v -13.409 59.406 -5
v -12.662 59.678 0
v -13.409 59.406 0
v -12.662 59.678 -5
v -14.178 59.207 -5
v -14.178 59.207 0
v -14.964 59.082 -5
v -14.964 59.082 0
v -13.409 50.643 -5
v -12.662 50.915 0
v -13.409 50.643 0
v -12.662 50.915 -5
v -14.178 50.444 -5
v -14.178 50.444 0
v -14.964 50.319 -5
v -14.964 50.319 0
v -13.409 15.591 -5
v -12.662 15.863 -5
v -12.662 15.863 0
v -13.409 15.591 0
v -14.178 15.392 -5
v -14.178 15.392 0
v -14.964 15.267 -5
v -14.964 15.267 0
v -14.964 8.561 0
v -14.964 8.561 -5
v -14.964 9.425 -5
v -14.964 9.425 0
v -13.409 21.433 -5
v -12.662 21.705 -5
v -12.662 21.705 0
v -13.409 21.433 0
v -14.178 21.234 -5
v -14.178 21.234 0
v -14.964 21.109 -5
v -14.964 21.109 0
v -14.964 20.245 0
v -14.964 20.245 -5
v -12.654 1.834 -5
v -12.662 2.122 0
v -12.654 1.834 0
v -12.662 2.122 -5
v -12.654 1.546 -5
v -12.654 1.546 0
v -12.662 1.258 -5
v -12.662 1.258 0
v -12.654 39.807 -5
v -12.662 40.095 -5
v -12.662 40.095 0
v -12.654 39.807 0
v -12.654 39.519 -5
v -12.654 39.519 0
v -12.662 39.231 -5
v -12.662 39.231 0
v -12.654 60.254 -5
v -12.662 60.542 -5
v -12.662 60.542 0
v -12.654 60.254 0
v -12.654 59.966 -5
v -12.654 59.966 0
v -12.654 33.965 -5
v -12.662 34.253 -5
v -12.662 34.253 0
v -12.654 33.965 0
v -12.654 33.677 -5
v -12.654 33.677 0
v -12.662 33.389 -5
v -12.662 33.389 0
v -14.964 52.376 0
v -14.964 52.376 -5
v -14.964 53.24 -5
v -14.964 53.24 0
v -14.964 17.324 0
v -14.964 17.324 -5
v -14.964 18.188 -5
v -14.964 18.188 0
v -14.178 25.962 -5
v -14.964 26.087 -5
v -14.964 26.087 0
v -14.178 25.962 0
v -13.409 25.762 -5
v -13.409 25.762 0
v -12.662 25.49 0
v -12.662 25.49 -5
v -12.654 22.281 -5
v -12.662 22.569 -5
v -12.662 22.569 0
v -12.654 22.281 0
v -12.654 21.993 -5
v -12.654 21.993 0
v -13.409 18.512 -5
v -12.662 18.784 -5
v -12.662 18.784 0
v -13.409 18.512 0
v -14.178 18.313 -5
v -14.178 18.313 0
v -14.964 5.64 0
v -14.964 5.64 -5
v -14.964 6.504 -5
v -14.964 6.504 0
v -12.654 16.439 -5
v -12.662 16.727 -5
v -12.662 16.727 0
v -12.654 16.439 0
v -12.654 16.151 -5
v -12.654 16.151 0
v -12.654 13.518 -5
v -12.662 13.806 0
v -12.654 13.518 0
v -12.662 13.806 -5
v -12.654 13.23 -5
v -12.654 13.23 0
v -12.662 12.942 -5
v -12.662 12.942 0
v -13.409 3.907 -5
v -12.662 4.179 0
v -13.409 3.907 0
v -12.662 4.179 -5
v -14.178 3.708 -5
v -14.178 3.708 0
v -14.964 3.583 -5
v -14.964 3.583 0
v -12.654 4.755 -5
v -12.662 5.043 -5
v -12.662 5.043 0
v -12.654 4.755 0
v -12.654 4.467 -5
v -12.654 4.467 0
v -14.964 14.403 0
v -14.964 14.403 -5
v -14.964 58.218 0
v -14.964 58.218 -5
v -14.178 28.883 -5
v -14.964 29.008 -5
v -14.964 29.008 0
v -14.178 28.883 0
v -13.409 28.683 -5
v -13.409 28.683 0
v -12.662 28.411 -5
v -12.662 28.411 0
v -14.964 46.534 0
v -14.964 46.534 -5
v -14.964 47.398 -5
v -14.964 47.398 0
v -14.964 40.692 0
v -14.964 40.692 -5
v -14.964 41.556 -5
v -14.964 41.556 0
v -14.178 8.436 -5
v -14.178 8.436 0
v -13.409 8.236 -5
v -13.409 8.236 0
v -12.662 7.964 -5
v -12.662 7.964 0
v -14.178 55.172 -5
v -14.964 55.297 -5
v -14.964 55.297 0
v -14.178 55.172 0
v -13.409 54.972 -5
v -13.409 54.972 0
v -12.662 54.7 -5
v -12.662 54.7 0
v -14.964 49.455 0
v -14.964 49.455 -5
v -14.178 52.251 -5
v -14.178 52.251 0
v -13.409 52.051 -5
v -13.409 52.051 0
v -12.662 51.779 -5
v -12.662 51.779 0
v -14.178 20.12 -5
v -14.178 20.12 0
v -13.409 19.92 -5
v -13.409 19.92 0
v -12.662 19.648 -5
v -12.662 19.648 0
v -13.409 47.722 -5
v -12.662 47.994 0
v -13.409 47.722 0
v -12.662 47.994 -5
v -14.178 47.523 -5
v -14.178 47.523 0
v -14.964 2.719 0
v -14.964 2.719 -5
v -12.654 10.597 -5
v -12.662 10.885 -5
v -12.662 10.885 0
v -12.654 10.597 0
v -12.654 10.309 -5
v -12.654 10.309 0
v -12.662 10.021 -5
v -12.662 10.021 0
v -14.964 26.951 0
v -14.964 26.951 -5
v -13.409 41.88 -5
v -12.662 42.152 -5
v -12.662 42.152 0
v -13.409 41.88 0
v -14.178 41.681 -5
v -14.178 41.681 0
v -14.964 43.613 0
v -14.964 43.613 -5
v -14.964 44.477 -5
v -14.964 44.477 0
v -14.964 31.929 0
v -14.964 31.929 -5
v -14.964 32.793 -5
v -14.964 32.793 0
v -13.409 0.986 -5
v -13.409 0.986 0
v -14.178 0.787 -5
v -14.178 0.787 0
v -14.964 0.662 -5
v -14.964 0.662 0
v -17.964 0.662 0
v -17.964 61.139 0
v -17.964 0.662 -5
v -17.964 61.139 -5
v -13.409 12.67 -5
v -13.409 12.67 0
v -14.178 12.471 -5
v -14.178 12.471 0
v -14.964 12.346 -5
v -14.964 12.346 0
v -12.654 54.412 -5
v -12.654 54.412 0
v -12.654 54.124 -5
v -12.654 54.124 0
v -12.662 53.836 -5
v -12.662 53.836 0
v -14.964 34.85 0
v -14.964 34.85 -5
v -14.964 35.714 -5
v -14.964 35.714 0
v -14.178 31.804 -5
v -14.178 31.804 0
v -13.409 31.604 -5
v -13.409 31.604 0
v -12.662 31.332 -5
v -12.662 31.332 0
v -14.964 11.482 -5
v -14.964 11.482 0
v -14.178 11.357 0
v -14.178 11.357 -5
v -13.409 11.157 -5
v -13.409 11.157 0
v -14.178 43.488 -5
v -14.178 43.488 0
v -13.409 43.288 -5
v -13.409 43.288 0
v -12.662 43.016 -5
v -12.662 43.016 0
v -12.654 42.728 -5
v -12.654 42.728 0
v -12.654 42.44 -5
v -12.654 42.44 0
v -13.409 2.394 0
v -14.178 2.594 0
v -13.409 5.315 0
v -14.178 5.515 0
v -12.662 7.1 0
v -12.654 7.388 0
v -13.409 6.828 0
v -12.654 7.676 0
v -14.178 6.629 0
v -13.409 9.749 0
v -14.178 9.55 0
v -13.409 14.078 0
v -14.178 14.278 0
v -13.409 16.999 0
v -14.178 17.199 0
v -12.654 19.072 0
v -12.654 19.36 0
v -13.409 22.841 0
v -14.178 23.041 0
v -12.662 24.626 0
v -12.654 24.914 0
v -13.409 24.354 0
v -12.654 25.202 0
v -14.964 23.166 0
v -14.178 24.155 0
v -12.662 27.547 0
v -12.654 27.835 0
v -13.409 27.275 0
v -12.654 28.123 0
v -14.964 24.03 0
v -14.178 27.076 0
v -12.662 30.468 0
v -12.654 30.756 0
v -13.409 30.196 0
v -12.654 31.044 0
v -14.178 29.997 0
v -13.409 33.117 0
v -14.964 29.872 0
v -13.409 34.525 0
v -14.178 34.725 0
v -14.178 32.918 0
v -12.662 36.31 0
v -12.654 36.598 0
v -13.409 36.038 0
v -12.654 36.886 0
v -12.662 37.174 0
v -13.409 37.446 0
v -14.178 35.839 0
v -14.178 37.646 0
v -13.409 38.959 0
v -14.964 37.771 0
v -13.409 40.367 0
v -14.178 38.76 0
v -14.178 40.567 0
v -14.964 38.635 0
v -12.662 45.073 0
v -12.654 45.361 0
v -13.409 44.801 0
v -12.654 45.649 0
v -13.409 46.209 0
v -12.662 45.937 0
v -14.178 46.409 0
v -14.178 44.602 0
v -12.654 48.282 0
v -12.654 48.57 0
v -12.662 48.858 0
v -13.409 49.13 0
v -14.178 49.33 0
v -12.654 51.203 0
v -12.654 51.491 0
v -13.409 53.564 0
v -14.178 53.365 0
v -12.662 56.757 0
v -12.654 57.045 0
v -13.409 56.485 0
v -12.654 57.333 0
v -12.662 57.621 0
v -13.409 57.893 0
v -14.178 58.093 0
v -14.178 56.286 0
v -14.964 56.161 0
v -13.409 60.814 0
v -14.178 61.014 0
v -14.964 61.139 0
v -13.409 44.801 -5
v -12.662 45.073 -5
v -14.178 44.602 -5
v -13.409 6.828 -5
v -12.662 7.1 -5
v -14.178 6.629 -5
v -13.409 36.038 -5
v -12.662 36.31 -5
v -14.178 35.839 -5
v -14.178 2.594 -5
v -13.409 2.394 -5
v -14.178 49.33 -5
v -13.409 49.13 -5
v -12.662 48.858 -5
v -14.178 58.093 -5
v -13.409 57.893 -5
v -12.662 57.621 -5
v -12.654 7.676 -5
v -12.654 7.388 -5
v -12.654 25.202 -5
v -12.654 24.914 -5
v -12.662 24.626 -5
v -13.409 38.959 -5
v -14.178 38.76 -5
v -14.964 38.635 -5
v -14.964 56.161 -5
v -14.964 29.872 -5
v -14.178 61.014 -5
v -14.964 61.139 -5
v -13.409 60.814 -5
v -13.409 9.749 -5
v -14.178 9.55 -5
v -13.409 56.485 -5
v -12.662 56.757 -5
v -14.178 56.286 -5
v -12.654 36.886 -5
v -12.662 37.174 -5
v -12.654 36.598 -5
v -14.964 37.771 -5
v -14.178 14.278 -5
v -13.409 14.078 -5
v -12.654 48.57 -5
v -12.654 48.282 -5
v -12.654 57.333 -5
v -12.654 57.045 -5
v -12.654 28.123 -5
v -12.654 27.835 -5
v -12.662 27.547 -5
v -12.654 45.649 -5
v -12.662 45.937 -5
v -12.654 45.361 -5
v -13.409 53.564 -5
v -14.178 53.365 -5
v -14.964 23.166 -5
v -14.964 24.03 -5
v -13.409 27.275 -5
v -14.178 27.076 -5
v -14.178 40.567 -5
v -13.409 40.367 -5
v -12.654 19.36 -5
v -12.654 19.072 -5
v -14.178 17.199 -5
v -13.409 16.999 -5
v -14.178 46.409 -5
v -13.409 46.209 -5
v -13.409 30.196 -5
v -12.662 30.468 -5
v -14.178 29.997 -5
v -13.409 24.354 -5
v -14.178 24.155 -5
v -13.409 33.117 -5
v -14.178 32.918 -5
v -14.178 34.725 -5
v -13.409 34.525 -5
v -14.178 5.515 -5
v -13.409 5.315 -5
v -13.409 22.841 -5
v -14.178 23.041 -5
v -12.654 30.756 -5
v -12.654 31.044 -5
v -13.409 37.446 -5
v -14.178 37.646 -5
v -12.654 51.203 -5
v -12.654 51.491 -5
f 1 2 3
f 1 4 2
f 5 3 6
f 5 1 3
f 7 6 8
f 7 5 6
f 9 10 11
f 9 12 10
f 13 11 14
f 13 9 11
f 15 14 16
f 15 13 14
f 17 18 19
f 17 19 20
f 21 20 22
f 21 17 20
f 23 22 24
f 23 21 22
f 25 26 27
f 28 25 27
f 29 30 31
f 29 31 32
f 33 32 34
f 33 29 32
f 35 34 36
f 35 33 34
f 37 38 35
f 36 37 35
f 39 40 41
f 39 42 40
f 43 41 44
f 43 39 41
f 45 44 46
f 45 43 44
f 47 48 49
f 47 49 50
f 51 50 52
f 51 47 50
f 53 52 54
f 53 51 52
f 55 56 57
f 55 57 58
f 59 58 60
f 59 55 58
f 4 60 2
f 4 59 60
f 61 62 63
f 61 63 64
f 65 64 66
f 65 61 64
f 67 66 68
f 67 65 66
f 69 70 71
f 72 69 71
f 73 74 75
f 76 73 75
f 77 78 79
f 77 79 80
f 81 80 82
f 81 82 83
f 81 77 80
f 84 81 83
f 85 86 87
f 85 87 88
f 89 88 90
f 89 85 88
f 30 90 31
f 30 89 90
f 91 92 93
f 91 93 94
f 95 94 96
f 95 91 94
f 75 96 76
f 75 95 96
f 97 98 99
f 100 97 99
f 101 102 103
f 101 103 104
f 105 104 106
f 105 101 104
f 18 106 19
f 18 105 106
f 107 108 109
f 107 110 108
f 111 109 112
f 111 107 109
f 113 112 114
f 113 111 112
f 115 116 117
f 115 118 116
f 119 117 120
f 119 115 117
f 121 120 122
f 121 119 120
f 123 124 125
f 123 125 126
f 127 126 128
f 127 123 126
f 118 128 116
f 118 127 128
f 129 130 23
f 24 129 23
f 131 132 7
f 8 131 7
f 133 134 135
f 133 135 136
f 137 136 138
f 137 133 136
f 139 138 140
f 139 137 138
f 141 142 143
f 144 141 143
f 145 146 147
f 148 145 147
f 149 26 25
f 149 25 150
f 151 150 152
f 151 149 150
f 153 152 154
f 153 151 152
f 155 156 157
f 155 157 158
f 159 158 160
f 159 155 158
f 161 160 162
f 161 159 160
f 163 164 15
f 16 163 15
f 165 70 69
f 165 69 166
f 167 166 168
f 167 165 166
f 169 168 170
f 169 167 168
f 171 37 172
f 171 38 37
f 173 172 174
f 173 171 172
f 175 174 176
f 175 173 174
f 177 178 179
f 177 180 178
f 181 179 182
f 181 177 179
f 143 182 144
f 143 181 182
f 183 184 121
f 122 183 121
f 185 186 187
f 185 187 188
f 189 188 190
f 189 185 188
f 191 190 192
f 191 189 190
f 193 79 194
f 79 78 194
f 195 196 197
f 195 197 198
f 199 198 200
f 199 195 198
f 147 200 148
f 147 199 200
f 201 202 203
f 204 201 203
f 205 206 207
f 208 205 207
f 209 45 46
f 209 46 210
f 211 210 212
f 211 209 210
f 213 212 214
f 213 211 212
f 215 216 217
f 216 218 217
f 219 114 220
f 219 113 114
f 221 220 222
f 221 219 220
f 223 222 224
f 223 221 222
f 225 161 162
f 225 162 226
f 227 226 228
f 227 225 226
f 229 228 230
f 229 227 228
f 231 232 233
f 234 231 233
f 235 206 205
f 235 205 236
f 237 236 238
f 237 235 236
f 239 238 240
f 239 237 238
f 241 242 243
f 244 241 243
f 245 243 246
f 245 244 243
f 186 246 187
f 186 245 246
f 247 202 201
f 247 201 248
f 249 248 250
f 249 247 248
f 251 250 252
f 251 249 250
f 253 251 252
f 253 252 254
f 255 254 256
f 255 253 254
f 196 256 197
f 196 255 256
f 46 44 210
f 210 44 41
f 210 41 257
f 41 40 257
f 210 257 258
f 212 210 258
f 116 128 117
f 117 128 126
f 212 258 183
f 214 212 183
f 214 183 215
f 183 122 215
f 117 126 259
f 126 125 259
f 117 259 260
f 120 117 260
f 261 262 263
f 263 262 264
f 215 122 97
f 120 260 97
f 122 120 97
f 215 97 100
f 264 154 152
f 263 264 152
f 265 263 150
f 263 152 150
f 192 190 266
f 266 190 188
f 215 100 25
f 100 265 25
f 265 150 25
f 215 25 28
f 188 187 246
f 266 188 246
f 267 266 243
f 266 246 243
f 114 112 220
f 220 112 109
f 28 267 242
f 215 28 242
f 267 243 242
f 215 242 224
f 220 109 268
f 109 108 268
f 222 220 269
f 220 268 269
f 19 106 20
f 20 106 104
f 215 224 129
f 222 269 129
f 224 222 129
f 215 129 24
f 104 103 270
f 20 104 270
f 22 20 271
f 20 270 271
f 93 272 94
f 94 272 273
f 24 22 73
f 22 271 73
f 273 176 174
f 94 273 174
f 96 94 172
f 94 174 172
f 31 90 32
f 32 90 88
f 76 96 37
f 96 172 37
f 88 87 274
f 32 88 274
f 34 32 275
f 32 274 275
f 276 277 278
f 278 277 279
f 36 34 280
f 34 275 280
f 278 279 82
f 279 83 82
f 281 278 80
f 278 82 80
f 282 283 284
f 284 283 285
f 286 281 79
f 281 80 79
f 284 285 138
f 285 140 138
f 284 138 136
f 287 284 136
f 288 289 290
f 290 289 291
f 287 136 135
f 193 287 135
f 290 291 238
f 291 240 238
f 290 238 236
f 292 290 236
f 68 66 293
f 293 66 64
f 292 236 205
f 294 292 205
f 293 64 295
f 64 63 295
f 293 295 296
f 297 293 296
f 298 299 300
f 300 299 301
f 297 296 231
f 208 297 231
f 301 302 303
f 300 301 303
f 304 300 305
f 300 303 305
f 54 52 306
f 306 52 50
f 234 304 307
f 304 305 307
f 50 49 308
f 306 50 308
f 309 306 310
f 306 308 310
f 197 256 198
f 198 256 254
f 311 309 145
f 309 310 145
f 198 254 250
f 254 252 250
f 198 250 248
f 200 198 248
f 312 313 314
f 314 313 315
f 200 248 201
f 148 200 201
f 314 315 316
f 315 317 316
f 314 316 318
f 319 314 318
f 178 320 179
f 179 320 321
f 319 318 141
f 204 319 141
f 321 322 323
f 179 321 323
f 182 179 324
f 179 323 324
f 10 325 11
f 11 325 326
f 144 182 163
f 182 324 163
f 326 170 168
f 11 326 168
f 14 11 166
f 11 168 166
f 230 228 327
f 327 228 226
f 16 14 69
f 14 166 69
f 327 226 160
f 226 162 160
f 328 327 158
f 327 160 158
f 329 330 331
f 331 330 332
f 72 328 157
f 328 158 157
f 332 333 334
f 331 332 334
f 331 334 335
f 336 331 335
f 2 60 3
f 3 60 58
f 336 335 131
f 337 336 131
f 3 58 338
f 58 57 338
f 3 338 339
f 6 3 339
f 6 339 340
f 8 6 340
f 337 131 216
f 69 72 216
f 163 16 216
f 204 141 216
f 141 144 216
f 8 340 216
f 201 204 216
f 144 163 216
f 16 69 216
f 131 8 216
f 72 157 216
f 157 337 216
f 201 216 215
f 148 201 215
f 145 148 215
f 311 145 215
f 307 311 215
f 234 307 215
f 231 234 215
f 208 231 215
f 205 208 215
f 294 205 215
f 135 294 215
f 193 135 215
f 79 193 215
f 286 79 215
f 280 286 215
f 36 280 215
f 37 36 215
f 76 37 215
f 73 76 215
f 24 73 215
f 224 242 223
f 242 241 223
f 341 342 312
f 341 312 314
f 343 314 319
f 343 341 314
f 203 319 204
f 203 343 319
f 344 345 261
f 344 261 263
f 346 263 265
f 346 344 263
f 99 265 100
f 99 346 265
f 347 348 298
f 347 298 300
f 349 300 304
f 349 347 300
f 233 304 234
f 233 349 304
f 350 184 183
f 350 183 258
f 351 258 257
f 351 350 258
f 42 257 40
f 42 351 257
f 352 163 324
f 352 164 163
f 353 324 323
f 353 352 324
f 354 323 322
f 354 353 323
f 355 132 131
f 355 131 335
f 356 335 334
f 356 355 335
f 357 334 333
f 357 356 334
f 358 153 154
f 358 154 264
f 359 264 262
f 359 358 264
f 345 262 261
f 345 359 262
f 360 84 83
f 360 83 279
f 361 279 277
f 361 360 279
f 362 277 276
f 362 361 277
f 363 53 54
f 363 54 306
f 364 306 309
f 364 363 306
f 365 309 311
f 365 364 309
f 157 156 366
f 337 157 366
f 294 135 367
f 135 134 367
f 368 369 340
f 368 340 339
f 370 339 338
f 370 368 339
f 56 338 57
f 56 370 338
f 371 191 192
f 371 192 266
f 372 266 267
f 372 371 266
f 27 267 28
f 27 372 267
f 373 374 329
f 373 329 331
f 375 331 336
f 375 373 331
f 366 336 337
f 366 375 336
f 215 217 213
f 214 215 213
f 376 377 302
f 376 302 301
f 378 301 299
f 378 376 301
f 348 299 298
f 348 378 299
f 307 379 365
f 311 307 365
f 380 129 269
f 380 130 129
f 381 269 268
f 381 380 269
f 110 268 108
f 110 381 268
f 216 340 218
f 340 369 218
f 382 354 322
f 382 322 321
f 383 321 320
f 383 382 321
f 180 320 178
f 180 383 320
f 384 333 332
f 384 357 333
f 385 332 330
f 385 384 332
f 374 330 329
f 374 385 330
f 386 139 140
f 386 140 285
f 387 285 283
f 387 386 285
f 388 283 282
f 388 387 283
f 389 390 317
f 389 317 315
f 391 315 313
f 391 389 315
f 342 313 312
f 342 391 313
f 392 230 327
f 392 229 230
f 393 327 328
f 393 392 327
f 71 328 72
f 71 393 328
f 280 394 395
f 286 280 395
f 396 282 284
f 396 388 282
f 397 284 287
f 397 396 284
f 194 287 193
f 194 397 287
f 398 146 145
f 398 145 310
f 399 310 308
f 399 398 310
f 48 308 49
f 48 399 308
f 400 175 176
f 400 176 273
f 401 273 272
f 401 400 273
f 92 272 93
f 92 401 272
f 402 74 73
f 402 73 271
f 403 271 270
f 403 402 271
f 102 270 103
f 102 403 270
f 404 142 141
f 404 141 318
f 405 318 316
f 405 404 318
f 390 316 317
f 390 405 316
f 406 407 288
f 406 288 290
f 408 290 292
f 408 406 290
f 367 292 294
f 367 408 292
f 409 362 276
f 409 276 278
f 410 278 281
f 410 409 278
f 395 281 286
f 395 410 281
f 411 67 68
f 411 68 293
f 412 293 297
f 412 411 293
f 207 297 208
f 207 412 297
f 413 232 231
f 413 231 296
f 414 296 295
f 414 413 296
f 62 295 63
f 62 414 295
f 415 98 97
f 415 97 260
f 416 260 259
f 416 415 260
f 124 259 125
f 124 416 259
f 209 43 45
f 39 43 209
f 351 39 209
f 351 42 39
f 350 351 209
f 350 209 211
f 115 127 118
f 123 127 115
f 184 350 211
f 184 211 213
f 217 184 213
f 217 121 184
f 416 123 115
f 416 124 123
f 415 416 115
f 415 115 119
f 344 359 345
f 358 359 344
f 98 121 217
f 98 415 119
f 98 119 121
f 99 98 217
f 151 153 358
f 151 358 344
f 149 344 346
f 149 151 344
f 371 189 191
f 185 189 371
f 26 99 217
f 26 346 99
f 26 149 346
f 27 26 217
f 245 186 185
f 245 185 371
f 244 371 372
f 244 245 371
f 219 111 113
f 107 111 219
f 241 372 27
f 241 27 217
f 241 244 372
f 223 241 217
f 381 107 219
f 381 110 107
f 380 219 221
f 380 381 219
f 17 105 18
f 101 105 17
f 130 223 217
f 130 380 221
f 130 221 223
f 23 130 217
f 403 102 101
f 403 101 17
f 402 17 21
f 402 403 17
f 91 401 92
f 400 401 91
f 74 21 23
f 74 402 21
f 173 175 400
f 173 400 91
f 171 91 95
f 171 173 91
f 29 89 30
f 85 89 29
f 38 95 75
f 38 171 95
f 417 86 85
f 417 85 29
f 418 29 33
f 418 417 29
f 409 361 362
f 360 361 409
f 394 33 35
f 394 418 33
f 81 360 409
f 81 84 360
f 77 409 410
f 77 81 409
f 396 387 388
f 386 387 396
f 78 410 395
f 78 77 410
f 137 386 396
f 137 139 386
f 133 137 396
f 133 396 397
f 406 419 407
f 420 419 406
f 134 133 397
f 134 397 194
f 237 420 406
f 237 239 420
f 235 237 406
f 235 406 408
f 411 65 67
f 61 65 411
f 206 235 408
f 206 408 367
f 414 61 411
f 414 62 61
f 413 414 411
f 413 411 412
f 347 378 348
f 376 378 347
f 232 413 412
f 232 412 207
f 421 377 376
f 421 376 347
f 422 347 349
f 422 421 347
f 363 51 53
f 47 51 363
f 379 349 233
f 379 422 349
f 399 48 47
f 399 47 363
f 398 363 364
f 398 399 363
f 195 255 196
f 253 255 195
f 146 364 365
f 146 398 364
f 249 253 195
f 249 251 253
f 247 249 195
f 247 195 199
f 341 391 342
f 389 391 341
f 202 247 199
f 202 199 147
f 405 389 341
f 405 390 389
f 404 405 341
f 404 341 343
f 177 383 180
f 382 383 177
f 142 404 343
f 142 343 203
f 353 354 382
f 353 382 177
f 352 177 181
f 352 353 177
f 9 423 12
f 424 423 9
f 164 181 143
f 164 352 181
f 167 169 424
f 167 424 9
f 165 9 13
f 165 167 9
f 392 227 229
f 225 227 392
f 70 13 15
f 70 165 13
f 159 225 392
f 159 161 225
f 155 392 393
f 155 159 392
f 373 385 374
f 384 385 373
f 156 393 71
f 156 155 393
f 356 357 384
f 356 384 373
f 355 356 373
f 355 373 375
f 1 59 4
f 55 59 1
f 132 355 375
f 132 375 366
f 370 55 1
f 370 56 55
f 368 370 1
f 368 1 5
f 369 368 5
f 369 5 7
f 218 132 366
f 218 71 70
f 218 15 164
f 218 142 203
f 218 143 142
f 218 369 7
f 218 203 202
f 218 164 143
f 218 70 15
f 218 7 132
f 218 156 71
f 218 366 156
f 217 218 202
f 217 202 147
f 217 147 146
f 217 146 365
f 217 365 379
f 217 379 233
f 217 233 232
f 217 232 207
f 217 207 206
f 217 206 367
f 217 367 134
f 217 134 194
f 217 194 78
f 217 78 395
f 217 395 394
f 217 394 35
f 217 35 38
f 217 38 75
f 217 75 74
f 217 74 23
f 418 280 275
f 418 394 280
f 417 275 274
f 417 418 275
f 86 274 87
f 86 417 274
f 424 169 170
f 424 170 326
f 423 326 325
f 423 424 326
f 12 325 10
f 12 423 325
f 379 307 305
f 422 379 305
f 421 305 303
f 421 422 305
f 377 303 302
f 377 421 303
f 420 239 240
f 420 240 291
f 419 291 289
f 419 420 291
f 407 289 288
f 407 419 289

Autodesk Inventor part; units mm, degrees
ref_plane "YZ Plane" through (0, 0, 0) normal (1, 0, 0) x (0, 1, 0)
ref_plane "XZ Plane" through (0, 0, 0) normal (0, 1, 0) x (-1, 0, 0)
ref_plane "XY Plane" through (0, 0, 0) normal (0, 0, 1) x (1, 0, 0)
ref_plane "Arbeitsebene1" through (0, 0, -5) normal (0, 0, -1) x (-1, 0, 0)
sketch "Skizze1" plane through (0, 0, -5) normal (0, 0, -1) x (-1, 0, 0)
  arc A0 (8.6893, -1.0285) -> (10.9915, -0.4319) centre (7.7825, 7.211) ccw
  arc A1 (10.9915, -0.4319) -> (10.9915, 0.4319) centre (0, 0) ccw
  arc A2 (10.9915, 0.4319) -> (8.6893, 1.0285) centre (7.7825, -7.211) ccw
  line L0 (8.6893, -1.0285) -> (8.6893, 1.0285) construction
  arc A3 (12.6615, 1.2584) -> (14.9637, 0.6618) centre (15.8705, 8.9013) ccw
  arc A4 (12.6615, 2.1221) -> (12.6615, 1.2584) centre (23.6531, 1.6903) ccw
  arc A5 (14.9637, 2.7187) -> (12.6615, 2.1221) centre (15.8705, -5.5208) ccw
  arc A6 (8.6893, 1.0285) -> (8.5819, 1.707) centre (0, 0) ccw construction
  arc A7 (8.6893, 1.0285) -> (8.5819, 1.707) centre (0, 0) ccw construction
  arc A8 (8.6893, 1.0285) -> (8.5819, 1.707) centre (0, 0) ccw construction
  arc A9 (8.6893, 1.0285) -> (8.5819, 1.707) centre (0, 0) ccw construction
  arc A10 (8.6893, 1.0285) -> (8.5819, 1.707) centre (0, 0) ccw construction
  arc A11 (12.6615, 4.1794) -> (14.9637, 3.5828) centre (15.8705, 11.8223) ccw
  arc A12 (12.6615, 5.0431) -> (12.6615, 4.1794) centre (23.6531, 4.6113) ccw
  arc A13 (14.9637, 5.6397) -> (12.6615, 5.0431) centre (15.8705, -2.5998) ccw
  arc A14 (12.6615, 7.1004) -> (14.9637, 6.5038) centre (15.8705, 14.7433) ccw
  arc A15 (12.6615, 7.9641) -> (12.6615, 7.1004) centre (23.6531, 7.5323) ccw
  arc A16 (14.9637, 8.5607) -> (12.6615, 7.9641) centre (15.8705, 0.3212) ccw
  arc A17 (12.6615, 10.0214) -> (14.9637, 9.4248) centre (15.8705, 17.6643) ccw
  arc A18 (12.6615, 10.8851) -> (12.6615, 10.0214) centre (23.6531, 10.4533) ccw
  arc A19 (14.9637, 11.4817) -> (12.6615, 10.8851) centre (15.8705, 3.2422) ccw
  arc A20 (12.6615, 12.9424) -> (14.9637, 12.3458) centre (15.8705, 20.5853) ccw
  arc A21 (12.6615, 13.8061) -> (12.6615, 12.9424) centre (23.6531, 13.3743) ccw
  arc A22 (14.9637, 14.4027) -> (12.6615, 13.8061) centre (15.8705, 6.1632) ccw
  arc A23 (12.6615, 15.8634) -> (14.9637, 15.2668) centre (15.8705, 23.5063) ccw
  arc A24 (12.6615, 16.7271) -> (12.6615, 15.8634) centre (23.6531, 16.2953) ccw
  arc A25 (14.9637, 17.3237) -> (12.6615, 16.7271) centre (15.8705, 9.0842) ccw
  arc A26 (12.6615, 18.7844) -> (14.9637, 18.1878) centre (15.8705, 26.4273) ccw
  arc A27 (12.6615, 19.6481) -> (12.6615, 18.7844) centre (23.6531, 19.2163) ccw
  arc A28 (14.9637, 20.2447) -> (12.6615, 19.6481) centre (15.8705, 12.0052) ccw
  arc A29 (12.6615, 21.7054) -> (14.9637, 21.1088) centre (15.8705, 29.3483) ccw
  arc A30 (12.6615, 22.5691) -> (12.6615, 21.7054) centre (23.6531, 22.1373) ccw
  arc A31 (14.9637, 23.1657) -> (12.6615, 22.5691) centre (15.8705, 14.9262) ccw
  arc A32 (12.6615, 24.6264) -> (14.9637, 24.0298) centre (15.8705, 32.2693) ccw
  arc A33 (12.6615, 25.4901) -> (12.6615, 24.6264) centre (23.6531, 25.0583) ccw
  arc A34 (14.9637, 26.0867) -> (12.6615, 25.4901) centre (15.8705, 17.8472) ccw
  arc A35 (12.6615, 27.5474) -> (14.9637, 26.9508) centre (15.8705, 35.1903) ccw
  arc A36 (12.6615, 28.4111) -> (12.6615, 27.5474) centre (23.6531, 27.9793) ccw
  arc A37 (14.9637, 29.0077) -> (12.6615, 28.4111) centre (15.8705, 20.7682) ccw
  arc A38 (12.6615, 30.4684) -> (14.9637, 29.8718) centre (15.8705, 38.1113) ccw
  arc A39 (12.6615, 31.3321) -> (12.6615, 30.4684) centre (23.6531, 30.9003) ccw
  arc A40 (14.9637, 31.9287) -> (12.6615, 31.3321) centre (15.8705, 23.6892) ccw
  arc A41 (12.6615, 33.3894) -> (14.9637, 32.7928) centre (15.8705, 41.0323) ccw
  arc A42 (12.6615, 34.2531) -> (12.6615, 33.3894) centre (23.6531, 33.8213) ccw
  arc A43 (14.9637, 34.8497) -> (12.6615, 34.2531) centre (15.8705, 26.6102) ccw
  arc A44 (12.6615, 36.3104) -> (14.9637, 35.7138) centre (15.8705, 43.9533) ccw
  arc A45 (12.6615, 37.1741) -> (12.6615, 36.3104) centre (23.6531, 36.7423) ccw
  arc A46 (14.9637, 37.7707) -> (12.6615, 37.1741) centre (15.8705, 29.5312) ccw
  arc A47 (12.6615, 39.2314) -> (14.9637, 38.6348) centre (15.8705, 46.8743) ccw
  arc A48 (12.6615, 40.0951) -> (12.6615, 39.2314) centre (23.6531, 39.6633) ccw
  arc A49 (14.9637, 40.6917) -> (12.6615, 40.0951) centre (15.8705, 32.4522) ccw
  arc A50 (12.6615, 42.1524) -> (14.9637, 41.5558) centre (15.8705, 49.7953) ccw
  arc A51 (12.6615, 43.0161) -> (12.6615, 42.1524) centre (23.6531, 42.5843) ccw
  arc A52 (14.9637, 43.6127) -> (12.6615, 43.0161) centre (15.8705, 35.3732) ccw
  arc A53 (12.6615, 45.0734) -> (14.9637, 44.4768) centre (15.8705, 52.7163) ccw
  arc A54 (12.6615, 45.9371) -> (12.6615, 45.0734) centre (23.6531, 45.5053) ccw
  arc A55 (14.9637, 46.5337) -> (12.6615, 45.9371) centre (15.8705, 38.2942) ccw
  arc A56 (12.6615, 47.9944) -> (14.9637, 47.3978) centre (15.8705, 55.6373) ccw
  arc A57 (12.6615, 48.8581) -> (12.6615, 47.9944) centre (23.6531, 48.4263) ccw
  arc A58 (14.9637, 49.4547) -> (12.6615, 48.8581) centre (15.8705, 41.2152) ccw
  arc A59 (12.6615, 50.9154) -> (14.9637, 50.3188) centre (15.8705, 58.5583) ccw
  arc A60 (12.6615, 51.7791) -> (12.6615, 50.9154) centre (23.6531, 51.3473) ccw
  arc A61 (14.9637, 52.3757) -> (12.6615, 51.7791) centre (15.8705, 44.1362) ccw
  arc A62 (12.6615, 53.8364) -> (14.9637, 53.2398) centre (15.8705, 61.4793) ccw
  arc A63 (12.6615, 54.7001) -> (12.6615, 53.8364) centre (23.6531, 54.2683) ccw
  arc A64 (14.9637, 55.2967) -> (12.6615, 54.7001) centre (15.8705, 47.0572) ccw
  arc A65 (12.6615, 56.7574) -> (14.9637, 56.1608) centre (15.8705, 64.4003) ccw
  arc A66 (12.6615, 57.6211) -> (12.6615, 56.7574) centre (23.6531, 57.1893) ccw
  arc A67 (14.9637, 58.2177) -> (12.6615, 57.6211) centre (15.8705, 49.9782) ccw
  arc A68 (12.6615, 59.6784) -> (14.9637, 59.0818) centre (15.8705, 67.3213) ccw
  arc A69 (12.6615, 60.5421) -> (12.6615, 59.6784) centre (23.6531, 60.1103) ccw
  arc A70 (14.9637, 61.1387) -> (12.6615, 60.5421) centre (15.8705, 52.8992) ccw
  line L1 (14.9637, 61.1387) -> (17.9637, 61.1387)
  line L2 (17.9637, 61.1387) -> (17.9637, 0.6618)
  line L3 (17.9637, 0.6618) -> (14.9637, 0.6618)
  line L4 (14.9637, 2.7187) -> (14.9637, 3.5828)
  line L5 (14.9637, 5.6397) -> (14.9637, 6.5038)
  line L6 (14.9637, 8.5607) -> (14.9637, 9.4248)
  line L7 (14.9637, 11.4817) -> (14.9637, 12.3458)
  line L8 (14.9637, 14.4027) -> (14.9637, 15.2668)
  line L9 (14.9637, 17.3237) -> (14.9637, 18.1878)
  line L10 (14.9637, 20.2447) -> (14.9637, 21.1088)
  line L11 (14.9637, 23.1657) -> (14.9637, 24.0298)
  line L12 (14.9637, 26.0867) -> (14.9637, 26.9508)
  line L13 (14.9637, 29.0077) -> (14.9637, 29.8718)
  line L14 (14.9637, 31.9287) -> (14.9637, 32.7928)
  line L15 (14.9637, 34.8497) -> (14.9637, 35.7138)
  line L16 (14.9637, 37.7707) -> (14.9637, 38.6348)
  line L17 (14.9637, 40.6917) -> (14.9637, 41.5558)
  line L18 (14.9637, 43.6127) -> (14.9637, 44.4768)
  line L19 (14.9637, 46.5337) -> (14.9637, 47.3978)
  line L20 (14.9637, 49.4547) -> (14.9637, 50.3188)
  line L21 (14.9637, 52.3757) -> (14.9637, 53.2398)
  line L22 (14.9637, 55.2967) -> (14.9637, 56.1608)
  line L23 (14.9637, 58.2177) -> (14.9637, 59.0818)
  point P0 (14.9637, 32.3608)
extrude "Extrusion1" add sketch "Skizze1" against normal blind 5
properties part number "Zahnstange"
